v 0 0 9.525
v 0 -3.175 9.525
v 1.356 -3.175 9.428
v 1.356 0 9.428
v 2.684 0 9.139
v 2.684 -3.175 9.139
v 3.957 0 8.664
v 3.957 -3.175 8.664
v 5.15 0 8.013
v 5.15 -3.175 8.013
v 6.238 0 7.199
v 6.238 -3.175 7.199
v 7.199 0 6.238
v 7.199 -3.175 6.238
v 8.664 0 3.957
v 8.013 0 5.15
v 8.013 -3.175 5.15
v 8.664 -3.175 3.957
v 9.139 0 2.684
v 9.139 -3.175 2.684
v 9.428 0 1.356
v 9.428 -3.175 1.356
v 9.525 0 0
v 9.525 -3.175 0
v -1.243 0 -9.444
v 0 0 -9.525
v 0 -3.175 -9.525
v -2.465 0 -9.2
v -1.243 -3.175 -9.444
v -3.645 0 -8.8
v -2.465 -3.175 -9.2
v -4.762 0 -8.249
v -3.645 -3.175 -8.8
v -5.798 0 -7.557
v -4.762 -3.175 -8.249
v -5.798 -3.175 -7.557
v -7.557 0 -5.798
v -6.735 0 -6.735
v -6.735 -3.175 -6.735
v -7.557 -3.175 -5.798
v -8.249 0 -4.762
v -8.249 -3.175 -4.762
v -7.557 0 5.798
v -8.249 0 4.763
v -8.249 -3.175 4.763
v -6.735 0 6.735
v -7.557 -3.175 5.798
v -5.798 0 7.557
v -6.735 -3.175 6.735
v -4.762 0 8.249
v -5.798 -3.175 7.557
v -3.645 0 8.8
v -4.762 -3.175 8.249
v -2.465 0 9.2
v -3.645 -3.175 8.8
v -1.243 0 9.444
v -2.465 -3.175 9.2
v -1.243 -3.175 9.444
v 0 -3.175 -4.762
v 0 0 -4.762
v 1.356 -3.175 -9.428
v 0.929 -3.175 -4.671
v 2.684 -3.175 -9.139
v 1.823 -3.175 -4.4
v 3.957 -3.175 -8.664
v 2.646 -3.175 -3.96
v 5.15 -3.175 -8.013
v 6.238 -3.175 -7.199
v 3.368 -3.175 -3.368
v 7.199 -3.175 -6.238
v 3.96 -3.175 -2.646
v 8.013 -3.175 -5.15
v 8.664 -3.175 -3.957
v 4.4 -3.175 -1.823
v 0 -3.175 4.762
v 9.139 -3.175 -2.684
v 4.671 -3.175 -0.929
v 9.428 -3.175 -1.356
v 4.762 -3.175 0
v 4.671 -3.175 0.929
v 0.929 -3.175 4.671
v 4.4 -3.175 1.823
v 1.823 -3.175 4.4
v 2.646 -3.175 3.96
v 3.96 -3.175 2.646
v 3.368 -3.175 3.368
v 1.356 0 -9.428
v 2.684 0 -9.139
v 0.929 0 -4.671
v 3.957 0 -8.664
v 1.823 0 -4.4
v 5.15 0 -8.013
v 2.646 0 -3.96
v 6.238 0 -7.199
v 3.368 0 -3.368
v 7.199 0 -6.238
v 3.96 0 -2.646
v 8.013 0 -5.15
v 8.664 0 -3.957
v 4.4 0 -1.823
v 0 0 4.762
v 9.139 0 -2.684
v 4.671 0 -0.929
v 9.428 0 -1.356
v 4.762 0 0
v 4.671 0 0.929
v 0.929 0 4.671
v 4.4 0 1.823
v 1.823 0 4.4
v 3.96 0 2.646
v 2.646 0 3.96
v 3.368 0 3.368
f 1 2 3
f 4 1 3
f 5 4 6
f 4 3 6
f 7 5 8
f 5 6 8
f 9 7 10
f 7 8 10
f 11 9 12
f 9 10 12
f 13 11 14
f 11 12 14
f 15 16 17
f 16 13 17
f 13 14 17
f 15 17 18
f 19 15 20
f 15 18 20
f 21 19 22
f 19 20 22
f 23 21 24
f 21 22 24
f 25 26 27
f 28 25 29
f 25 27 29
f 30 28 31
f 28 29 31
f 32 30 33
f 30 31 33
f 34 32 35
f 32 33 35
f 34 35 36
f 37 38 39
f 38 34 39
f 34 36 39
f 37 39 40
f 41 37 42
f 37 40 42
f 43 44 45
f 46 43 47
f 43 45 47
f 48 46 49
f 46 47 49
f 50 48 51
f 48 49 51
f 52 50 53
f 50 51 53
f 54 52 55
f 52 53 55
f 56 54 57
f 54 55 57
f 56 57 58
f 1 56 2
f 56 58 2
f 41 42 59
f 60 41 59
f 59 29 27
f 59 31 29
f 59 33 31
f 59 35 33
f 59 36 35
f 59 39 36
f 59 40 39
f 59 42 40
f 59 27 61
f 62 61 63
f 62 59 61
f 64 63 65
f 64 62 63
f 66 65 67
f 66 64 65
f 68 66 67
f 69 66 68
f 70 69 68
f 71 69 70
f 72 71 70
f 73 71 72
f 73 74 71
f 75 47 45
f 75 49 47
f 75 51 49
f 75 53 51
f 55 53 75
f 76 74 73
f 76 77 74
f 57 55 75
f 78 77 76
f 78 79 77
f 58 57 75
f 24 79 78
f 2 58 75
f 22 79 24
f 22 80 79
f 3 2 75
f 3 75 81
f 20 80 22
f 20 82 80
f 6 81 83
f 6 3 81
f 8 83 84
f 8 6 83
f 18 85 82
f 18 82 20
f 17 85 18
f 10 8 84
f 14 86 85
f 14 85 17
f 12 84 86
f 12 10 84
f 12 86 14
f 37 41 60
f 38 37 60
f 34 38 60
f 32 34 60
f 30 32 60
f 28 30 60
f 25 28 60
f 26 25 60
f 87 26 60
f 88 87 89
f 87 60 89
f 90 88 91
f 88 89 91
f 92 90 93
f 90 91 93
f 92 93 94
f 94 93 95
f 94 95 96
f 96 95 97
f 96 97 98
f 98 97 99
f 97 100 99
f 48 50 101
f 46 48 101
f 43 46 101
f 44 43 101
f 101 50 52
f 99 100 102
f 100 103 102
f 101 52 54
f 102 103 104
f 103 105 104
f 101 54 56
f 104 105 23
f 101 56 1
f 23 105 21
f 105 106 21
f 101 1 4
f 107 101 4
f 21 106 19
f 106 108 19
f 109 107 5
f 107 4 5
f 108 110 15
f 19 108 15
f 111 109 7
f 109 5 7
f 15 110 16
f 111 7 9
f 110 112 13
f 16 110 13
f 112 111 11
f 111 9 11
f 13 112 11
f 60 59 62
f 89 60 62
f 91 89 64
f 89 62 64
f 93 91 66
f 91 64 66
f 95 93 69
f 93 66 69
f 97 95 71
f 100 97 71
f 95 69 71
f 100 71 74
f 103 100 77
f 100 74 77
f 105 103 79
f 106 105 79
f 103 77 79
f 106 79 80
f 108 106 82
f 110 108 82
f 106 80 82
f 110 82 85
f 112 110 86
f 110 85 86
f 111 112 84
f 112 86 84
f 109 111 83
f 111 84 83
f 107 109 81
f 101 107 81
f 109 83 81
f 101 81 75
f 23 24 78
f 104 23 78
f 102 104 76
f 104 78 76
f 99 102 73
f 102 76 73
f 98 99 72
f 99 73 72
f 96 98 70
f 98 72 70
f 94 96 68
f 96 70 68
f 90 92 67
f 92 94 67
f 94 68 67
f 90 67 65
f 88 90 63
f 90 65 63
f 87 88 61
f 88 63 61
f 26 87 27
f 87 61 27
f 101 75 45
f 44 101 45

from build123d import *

# Parameters (mm, degrees)
F0_W     = 19.05
F0_H     = 19.05
F1_DEPTH = 3.175
F3_DEPTH = 25.4
F5_DEPTH = 25.4


with BuildPart() as f1:
    # F0 (on Front) → F1 (new body)
    with BuildSketch(Plane.XZ):
        Rectangle(F0_W, F0_H)
    extrude(amount=F1_DEPTH)

    # F2 (on face) → F3 (cut)
    with BuildSketch(Plane.XZ.offset(3.175)):
        with BuildLine():
            ThreePointArc((0, -4.7625), (3.3675960454, -3.3675960454), (4.7625, 0))
            ThreePointArc((4.7625, 0), (3.3675960454, 3.3675960454), (0, 4.7625))
            ThreePointArc((0, 4.7625), (-4.7625, 0), (0, -4.7625))
        make_face()
        with BuildLine():
            ThreePointArc((0, -4.7625), (-4.7625, 0), (0, 4.7625))
            Line((0, 4.7625), (-9.525, 4.7625))
            Line((-9.525, 4.7625), (-9.525, -4.7625))
            Line((-9.525, -4.7625), (0, -4.7625))
        make_face()
    extrude(amount=-F3_DEPTH, mode=Mode.SUBTRACT)

    # F4 (on face) → F5 (cut)
    with BuildSketch(Plane.XZ.offset(3.175)):
        with BuildLine():
            ThreePointArc((-8.248891971, 4.7625), (-4.7625, 8.248891971), (0, 9.525))
            Line((0, 9.525), (-9.525, 9.525))
            Line((-9.525, 9.525), (-9.525, 4.7625))
            Line((-9.525, 4.7625), (-8.248891971, 4.7625))
        make_face()
        with BuildLine():
            ThreePointArc((0, 9.525), (6.7351920908, 6.7351920908), (9.525, 0))
            Line((9.525, 0), (9.525, 9.525))
            Line((9.525, 9.525), (0, 9.525))
        make_face()
        with BuildLine():
            Line((9.525, -9.525), (9.525, 0))
            ThreePointArc((9.525, 0), (6.7351920908, -6.7351920908), (0, -9.525))
            Line((0, -9.525), (9.525, -9.525))
        make_face()
        with BuildLine():
            Line((-9.525, -9.525), (0, -9.525))
            ThreePointArc((0, -9.525), (-4.7625, -8.248891971), (-8.248891971, -4.7625))
            Line((-8.248891971, -4.7625), (-9.525, -4.7625))
            Line((-9.525, -4.7625), (-9.525, -9.525))
        make_face()
    extrude(amount=-F5_DEPTH, mode=Mode.SUBTRACT)


solid = f1.part
